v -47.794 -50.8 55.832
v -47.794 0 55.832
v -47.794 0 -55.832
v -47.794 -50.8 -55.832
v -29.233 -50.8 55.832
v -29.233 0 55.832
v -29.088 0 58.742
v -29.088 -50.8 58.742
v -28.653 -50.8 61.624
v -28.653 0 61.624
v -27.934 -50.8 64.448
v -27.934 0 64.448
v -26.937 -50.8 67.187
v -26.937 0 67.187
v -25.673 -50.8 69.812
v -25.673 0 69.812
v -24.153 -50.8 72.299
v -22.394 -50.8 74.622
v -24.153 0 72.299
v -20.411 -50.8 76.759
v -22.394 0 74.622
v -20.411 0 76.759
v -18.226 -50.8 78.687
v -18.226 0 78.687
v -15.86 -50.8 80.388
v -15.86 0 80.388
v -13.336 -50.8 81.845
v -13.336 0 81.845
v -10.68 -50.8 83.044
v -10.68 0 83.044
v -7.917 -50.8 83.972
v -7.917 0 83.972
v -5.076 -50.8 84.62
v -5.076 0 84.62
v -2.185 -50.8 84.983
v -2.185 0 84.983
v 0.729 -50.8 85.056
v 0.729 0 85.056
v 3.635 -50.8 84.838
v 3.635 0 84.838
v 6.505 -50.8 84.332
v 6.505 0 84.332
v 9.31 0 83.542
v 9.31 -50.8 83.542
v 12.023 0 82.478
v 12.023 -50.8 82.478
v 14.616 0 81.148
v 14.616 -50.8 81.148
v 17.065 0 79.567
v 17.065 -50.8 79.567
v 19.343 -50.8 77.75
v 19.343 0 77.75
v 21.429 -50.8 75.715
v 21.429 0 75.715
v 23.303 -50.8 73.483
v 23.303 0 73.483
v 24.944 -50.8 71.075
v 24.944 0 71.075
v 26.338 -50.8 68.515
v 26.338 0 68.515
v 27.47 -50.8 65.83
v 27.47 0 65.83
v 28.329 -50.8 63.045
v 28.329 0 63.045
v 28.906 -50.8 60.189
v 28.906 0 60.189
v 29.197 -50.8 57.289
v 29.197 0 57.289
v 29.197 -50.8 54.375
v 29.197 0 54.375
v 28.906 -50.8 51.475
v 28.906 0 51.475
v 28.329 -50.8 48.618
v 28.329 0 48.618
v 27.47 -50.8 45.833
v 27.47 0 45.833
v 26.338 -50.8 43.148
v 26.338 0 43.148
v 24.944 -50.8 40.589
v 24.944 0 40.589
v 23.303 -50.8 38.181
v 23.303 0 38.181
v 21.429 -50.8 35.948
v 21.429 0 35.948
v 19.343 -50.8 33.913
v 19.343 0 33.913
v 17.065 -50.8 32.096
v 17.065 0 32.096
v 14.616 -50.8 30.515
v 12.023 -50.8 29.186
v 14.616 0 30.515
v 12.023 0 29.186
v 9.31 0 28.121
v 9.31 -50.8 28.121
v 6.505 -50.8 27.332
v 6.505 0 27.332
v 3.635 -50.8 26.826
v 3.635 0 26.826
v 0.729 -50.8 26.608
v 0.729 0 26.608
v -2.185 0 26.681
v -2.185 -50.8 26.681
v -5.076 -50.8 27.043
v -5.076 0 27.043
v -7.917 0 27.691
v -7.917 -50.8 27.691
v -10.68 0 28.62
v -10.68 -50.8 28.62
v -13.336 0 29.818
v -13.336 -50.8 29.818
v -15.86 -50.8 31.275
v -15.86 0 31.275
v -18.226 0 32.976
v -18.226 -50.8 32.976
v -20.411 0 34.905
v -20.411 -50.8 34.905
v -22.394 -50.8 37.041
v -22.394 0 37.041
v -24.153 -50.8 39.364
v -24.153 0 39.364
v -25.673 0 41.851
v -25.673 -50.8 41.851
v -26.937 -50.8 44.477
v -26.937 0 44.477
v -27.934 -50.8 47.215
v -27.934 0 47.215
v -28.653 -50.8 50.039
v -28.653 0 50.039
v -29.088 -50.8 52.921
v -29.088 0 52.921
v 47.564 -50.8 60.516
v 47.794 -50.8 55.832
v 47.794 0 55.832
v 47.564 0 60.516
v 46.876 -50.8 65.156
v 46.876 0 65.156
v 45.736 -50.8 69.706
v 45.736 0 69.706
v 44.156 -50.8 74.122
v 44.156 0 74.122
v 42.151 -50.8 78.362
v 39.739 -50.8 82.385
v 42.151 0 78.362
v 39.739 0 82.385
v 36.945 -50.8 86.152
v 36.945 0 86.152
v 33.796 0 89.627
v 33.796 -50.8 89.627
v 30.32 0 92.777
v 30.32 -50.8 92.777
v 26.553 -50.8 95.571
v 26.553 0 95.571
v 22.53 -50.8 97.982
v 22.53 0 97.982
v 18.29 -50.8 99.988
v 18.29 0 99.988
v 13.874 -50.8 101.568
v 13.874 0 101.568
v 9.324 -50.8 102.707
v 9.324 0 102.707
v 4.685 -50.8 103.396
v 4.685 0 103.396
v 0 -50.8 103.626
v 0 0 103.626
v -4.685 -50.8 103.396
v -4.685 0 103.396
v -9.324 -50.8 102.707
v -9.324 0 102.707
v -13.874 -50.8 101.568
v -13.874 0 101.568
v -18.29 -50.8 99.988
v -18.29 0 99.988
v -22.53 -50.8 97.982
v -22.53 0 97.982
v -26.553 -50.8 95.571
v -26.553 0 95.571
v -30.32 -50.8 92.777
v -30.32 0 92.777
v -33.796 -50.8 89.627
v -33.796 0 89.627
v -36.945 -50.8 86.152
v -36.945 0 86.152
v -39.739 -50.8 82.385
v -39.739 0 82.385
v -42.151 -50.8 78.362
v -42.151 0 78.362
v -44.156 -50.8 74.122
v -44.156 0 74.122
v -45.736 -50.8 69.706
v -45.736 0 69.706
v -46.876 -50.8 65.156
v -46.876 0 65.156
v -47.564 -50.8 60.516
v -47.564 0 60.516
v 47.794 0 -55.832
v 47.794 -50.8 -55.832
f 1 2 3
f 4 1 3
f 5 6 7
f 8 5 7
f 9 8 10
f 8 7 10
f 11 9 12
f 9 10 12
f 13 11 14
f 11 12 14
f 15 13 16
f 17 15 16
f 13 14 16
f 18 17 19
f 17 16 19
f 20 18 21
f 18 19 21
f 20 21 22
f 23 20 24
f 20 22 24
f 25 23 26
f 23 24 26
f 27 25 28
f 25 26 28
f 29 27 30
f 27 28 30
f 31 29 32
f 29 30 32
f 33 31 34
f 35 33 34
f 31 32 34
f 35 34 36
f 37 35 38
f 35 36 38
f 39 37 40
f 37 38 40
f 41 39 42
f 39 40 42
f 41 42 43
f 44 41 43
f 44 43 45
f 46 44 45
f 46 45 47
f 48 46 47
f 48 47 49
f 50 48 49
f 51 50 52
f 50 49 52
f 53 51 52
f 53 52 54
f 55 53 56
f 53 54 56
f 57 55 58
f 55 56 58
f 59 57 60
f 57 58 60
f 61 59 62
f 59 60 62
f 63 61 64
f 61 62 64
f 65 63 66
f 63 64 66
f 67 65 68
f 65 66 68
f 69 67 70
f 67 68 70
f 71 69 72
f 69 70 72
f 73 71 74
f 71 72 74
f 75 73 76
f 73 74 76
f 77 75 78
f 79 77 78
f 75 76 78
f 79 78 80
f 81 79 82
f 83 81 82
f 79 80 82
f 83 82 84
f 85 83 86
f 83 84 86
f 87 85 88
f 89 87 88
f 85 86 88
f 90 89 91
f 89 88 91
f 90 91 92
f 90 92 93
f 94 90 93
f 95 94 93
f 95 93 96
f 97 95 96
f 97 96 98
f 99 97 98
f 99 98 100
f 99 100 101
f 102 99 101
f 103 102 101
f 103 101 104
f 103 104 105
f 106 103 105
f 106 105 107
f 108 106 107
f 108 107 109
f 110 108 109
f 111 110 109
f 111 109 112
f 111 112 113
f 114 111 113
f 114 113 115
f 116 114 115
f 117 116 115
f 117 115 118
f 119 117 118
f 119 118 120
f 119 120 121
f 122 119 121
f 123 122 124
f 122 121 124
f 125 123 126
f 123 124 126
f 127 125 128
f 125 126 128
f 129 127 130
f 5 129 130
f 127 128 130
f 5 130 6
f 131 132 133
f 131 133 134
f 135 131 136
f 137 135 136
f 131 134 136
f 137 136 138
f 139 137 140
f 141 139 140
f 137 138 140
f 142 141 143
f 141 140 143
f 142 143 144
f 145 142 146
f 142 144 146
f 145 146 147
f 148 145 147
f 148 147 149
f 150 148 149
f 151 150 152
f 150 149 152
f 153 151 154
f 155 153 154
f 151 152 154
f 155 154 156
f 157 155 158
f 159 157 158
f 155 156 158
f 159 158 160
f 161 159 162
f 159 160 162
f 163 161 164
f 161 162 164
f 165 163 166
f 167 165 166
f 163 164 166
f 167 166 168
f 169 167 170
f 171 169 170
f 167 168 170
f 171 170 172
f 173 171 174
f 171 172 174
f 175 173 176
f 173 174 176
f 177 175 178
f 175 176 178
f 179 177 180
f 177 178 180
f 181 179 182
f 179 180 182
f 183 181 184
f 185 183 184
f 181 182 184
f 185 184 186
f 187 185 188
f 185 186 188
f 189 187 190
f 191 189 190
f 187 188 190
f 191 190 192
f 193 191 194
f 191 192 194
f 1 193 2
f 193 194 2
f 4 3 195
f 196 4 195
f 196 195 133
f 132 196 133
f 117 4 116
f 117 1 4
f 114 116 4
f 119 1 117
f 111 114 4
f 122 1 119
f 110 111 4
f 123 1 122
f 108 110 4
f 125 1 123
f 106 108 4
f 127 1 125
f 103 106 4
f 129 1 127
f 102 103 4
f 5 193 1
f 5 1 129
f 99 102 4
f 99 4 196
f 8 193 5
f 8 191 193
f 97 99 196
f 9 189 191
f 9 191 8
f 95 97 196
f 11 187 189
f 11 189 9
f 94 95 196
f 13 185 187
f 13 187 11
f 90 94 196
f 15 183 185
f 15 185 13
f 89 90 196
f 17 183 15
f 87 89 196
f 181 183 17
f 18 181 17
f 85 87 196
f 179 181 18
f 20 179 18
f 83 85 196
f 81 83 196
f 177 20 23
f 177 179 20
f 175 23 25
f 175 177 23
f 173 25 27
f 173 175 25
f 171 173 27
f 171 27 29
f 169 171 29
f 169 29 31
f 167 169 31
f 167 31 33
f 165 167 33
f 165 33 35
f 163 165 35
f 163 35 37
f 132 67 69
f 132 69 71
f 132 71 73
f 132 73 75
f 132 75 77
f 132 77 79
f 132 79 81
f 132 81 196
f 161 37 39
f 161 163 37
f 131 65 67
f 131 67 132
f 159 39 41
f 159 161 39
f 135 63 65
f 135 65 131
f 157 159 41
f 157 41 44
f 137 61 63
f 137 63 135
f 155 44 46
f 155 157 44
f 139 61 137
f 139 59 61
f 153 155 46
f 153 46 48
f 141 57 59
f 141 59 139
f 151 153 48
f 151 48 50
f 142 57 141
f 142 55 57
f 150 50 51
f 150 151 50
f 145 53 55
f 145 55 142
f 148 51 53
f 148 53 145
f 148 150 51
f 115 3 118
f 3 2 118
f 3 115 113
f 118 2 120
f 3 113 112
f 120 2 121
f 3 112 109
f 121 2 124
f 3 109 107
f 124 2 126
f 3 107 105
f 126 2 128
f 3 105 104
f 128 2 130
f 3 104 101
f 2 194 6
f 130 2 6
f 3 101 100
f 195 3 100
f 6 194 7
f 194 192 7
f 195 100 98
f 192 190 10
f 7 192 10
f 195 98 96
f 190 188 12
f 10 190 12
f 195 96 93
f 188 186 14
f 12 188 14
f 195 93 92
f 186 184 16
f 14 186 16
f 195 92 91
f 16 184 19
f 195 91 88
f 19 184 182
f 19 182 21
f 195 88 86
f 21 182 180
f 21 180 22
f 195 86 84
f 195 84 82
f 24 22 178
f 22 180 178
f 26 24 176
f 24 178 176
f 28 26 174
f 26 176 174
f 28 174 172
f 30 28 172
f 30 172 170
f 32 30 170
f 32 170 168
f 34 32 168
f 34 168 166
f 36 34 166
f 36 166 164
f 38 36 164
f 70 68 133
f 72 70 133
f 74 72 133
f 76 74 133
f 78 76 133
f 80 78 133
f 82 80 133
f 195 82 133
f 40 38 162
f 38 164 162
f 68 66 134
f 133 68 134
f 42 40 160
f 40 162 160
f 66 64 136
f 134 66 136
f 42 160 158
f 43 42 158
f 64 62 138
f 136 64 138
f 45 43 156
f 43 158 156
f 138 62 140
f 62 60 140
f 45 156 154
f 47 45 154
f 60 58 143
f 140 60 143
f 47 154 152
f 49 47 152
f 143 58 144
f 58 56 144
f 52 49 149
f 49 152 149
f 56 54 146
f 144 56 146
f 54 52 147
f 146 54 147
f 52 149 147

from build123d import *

# Parameters (mm, degrees)
F1_DEPTH = 50.8


with BuildPart() as f1:
    # F0 (on Front) → F1 (new body)
    with BuildSketch(Plane.XZ):
        with BuildLine():
            Line((47.794078, -55.831682), (47.794078, 55.831682))
            Line((47.794078, 55.831682), (29.232915, 55.831682))
            ThreePointArc((29.232915, 55.831682), (0, 26.598767), (-29.232915, 55.831682))
            Line((-29.232915, 55.831682), (-47.794078, 55.831682))
            Line((-47.794078, 55.831682), (-47.794078, -55.831682))
            Line((-47.794078, -55.831682), (47.794078, -55.831682))
        make_face()
        with BuildLine():
            Line((29.232915, 55.831682), (47.794078, 55.831682))
            ThreePointArc((47.794078, 55.831682), (0, 103.625759), (-47.794078, 55.831682))
            Line((-47.794078, 55.831682), (-29.232915, 55.831682))
            ThreePointArc((-29.232915, 55.831682), (0, 85.064597), (29.232915, 55.831682))
        make_face()
    extrude(amount=F1_DEPTH)


solid = f1.part
